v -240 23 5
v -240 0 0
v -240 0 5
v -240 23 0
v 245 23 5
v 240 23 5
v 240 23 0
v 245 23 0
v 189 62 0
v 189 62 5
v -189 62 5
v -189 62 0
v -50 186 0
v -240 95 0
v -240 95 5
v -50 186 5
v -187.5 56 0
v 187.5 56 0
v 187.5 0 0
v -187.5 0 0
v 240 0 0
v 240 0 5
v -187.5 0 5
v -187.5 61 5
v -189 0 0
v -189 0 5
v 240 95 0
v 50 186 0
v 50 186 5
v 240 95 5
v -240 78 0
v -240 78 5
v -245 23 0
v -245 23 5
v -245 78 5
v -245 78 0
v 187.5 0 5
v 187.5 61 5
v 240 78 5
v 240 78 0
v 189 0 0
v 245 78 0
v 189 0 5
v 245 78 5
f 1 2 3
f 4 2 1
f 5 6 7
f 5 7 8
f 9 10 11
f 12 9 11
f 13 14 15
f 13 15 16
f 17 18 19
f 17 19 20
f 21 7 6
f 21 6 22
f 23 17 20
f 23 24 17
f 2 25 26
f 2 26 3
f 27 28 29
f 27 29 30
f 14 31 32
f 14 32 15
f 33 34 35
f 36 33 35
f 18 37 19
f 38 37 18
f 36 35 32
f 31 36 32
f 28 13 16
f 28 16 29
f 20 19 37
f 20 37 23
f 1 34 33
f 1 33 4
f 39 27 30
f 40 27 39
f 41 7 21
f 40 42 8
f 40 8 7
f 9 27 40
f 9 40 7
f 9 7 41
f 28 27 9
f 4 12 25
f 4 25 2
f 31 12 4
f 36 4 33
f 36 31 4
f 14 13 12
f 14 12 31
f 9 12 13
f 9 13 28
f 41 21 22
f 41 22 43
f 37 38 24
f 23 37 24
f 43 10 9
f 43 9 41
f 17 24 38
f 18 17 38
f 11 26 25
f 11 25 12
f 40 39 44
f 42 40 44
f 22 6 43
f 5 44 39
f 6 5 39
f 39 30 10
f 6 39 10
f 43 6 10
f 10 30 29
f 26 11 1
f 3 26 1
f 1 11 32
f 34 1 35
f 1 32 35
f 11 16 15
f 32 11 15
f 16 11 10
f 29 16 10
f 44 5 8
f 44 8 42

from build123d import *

# Parameters (mm, degrees)
GRUNDFL_CHE_DEPTH          = 5
SKIZZE3_W                  = 5
SKIZZE3_H                  = 55
ZAPFENSEITENLEITWERK_DEPTH = 5
H_HENLEITWERK_DEPTH        = 308.645900346
FASE1_SIZE                 = 5


with BuildPart() as part:
    # Skizze1 → Grundfläche (new body)
    with BuildSketch(Plane.XY):
        Polygon((240, 0), (-240, 0), (-240, 95), (-50, 186), (50, 186), (240, 95), align=None)
    extrude(amount=GRUNDFL_CHE_DEPTH)

    # Skizze3 → ZapfenSeitenleitwerk (add)
    with BuildSketch(Plane.XY.offset(5)):
        with Locations((242.5, 50.5)):
            Rectangle(SKIZZE3_W, SKIZZE3_H)
        with Locations((-242.5, 50.5)):
            Rectangle(SKIZZE3_W, SKIZZE3_H)
    extrude(amount=-ZAPFENSEITENLEITWERK_DEPTH)

    # Skizze4 → Höhenleitwerk (cut, through all)
    with BuildSketch(Plane.XY.offset(5)):
        Polygon((-187.5, 0), (-189, 0), (-189, 62), (-187.5, 62), (187.5, 62), (189, 62), (189, 0), (187.5, 0), (187.5, 61), (-187.5, 61), align=None)
    extrude(amount=-H_HENLEITWERK_DEPTH, mode=Mode.SUBTRACT)


with BuildPart() as h_henleitwerk_piece_1:
    # of the separate pieces the step leaves, piece 1, a body of its own (h_henleitwerk_pieces)
    add(part.part.solids().sort_by_distance((240, 0, 0))[0])


with BuildPart() as h_henleitwerk_piece_2:
    # of the separate pieces the step leaves, piece 2, a body of its own (h_henleitwerk_pieces)
    add(part.part.solids().sort_by_distance((187.5, 0, 0))[0])

    # Fase1
    fase1_edges = [h_henleitwerk_piece_2.edges().sort_by_distance(p)[0] for p in [
        (0, 61, 0),
    ]]
    chamfer(fase1_edges, length=FASE1_SIZE - 0.0001)  # a hair under: the kernel refuses the full size


solid = Compound([h_henleitwerk_piece_1.part, h_henleitwerk_piece_2.part])
